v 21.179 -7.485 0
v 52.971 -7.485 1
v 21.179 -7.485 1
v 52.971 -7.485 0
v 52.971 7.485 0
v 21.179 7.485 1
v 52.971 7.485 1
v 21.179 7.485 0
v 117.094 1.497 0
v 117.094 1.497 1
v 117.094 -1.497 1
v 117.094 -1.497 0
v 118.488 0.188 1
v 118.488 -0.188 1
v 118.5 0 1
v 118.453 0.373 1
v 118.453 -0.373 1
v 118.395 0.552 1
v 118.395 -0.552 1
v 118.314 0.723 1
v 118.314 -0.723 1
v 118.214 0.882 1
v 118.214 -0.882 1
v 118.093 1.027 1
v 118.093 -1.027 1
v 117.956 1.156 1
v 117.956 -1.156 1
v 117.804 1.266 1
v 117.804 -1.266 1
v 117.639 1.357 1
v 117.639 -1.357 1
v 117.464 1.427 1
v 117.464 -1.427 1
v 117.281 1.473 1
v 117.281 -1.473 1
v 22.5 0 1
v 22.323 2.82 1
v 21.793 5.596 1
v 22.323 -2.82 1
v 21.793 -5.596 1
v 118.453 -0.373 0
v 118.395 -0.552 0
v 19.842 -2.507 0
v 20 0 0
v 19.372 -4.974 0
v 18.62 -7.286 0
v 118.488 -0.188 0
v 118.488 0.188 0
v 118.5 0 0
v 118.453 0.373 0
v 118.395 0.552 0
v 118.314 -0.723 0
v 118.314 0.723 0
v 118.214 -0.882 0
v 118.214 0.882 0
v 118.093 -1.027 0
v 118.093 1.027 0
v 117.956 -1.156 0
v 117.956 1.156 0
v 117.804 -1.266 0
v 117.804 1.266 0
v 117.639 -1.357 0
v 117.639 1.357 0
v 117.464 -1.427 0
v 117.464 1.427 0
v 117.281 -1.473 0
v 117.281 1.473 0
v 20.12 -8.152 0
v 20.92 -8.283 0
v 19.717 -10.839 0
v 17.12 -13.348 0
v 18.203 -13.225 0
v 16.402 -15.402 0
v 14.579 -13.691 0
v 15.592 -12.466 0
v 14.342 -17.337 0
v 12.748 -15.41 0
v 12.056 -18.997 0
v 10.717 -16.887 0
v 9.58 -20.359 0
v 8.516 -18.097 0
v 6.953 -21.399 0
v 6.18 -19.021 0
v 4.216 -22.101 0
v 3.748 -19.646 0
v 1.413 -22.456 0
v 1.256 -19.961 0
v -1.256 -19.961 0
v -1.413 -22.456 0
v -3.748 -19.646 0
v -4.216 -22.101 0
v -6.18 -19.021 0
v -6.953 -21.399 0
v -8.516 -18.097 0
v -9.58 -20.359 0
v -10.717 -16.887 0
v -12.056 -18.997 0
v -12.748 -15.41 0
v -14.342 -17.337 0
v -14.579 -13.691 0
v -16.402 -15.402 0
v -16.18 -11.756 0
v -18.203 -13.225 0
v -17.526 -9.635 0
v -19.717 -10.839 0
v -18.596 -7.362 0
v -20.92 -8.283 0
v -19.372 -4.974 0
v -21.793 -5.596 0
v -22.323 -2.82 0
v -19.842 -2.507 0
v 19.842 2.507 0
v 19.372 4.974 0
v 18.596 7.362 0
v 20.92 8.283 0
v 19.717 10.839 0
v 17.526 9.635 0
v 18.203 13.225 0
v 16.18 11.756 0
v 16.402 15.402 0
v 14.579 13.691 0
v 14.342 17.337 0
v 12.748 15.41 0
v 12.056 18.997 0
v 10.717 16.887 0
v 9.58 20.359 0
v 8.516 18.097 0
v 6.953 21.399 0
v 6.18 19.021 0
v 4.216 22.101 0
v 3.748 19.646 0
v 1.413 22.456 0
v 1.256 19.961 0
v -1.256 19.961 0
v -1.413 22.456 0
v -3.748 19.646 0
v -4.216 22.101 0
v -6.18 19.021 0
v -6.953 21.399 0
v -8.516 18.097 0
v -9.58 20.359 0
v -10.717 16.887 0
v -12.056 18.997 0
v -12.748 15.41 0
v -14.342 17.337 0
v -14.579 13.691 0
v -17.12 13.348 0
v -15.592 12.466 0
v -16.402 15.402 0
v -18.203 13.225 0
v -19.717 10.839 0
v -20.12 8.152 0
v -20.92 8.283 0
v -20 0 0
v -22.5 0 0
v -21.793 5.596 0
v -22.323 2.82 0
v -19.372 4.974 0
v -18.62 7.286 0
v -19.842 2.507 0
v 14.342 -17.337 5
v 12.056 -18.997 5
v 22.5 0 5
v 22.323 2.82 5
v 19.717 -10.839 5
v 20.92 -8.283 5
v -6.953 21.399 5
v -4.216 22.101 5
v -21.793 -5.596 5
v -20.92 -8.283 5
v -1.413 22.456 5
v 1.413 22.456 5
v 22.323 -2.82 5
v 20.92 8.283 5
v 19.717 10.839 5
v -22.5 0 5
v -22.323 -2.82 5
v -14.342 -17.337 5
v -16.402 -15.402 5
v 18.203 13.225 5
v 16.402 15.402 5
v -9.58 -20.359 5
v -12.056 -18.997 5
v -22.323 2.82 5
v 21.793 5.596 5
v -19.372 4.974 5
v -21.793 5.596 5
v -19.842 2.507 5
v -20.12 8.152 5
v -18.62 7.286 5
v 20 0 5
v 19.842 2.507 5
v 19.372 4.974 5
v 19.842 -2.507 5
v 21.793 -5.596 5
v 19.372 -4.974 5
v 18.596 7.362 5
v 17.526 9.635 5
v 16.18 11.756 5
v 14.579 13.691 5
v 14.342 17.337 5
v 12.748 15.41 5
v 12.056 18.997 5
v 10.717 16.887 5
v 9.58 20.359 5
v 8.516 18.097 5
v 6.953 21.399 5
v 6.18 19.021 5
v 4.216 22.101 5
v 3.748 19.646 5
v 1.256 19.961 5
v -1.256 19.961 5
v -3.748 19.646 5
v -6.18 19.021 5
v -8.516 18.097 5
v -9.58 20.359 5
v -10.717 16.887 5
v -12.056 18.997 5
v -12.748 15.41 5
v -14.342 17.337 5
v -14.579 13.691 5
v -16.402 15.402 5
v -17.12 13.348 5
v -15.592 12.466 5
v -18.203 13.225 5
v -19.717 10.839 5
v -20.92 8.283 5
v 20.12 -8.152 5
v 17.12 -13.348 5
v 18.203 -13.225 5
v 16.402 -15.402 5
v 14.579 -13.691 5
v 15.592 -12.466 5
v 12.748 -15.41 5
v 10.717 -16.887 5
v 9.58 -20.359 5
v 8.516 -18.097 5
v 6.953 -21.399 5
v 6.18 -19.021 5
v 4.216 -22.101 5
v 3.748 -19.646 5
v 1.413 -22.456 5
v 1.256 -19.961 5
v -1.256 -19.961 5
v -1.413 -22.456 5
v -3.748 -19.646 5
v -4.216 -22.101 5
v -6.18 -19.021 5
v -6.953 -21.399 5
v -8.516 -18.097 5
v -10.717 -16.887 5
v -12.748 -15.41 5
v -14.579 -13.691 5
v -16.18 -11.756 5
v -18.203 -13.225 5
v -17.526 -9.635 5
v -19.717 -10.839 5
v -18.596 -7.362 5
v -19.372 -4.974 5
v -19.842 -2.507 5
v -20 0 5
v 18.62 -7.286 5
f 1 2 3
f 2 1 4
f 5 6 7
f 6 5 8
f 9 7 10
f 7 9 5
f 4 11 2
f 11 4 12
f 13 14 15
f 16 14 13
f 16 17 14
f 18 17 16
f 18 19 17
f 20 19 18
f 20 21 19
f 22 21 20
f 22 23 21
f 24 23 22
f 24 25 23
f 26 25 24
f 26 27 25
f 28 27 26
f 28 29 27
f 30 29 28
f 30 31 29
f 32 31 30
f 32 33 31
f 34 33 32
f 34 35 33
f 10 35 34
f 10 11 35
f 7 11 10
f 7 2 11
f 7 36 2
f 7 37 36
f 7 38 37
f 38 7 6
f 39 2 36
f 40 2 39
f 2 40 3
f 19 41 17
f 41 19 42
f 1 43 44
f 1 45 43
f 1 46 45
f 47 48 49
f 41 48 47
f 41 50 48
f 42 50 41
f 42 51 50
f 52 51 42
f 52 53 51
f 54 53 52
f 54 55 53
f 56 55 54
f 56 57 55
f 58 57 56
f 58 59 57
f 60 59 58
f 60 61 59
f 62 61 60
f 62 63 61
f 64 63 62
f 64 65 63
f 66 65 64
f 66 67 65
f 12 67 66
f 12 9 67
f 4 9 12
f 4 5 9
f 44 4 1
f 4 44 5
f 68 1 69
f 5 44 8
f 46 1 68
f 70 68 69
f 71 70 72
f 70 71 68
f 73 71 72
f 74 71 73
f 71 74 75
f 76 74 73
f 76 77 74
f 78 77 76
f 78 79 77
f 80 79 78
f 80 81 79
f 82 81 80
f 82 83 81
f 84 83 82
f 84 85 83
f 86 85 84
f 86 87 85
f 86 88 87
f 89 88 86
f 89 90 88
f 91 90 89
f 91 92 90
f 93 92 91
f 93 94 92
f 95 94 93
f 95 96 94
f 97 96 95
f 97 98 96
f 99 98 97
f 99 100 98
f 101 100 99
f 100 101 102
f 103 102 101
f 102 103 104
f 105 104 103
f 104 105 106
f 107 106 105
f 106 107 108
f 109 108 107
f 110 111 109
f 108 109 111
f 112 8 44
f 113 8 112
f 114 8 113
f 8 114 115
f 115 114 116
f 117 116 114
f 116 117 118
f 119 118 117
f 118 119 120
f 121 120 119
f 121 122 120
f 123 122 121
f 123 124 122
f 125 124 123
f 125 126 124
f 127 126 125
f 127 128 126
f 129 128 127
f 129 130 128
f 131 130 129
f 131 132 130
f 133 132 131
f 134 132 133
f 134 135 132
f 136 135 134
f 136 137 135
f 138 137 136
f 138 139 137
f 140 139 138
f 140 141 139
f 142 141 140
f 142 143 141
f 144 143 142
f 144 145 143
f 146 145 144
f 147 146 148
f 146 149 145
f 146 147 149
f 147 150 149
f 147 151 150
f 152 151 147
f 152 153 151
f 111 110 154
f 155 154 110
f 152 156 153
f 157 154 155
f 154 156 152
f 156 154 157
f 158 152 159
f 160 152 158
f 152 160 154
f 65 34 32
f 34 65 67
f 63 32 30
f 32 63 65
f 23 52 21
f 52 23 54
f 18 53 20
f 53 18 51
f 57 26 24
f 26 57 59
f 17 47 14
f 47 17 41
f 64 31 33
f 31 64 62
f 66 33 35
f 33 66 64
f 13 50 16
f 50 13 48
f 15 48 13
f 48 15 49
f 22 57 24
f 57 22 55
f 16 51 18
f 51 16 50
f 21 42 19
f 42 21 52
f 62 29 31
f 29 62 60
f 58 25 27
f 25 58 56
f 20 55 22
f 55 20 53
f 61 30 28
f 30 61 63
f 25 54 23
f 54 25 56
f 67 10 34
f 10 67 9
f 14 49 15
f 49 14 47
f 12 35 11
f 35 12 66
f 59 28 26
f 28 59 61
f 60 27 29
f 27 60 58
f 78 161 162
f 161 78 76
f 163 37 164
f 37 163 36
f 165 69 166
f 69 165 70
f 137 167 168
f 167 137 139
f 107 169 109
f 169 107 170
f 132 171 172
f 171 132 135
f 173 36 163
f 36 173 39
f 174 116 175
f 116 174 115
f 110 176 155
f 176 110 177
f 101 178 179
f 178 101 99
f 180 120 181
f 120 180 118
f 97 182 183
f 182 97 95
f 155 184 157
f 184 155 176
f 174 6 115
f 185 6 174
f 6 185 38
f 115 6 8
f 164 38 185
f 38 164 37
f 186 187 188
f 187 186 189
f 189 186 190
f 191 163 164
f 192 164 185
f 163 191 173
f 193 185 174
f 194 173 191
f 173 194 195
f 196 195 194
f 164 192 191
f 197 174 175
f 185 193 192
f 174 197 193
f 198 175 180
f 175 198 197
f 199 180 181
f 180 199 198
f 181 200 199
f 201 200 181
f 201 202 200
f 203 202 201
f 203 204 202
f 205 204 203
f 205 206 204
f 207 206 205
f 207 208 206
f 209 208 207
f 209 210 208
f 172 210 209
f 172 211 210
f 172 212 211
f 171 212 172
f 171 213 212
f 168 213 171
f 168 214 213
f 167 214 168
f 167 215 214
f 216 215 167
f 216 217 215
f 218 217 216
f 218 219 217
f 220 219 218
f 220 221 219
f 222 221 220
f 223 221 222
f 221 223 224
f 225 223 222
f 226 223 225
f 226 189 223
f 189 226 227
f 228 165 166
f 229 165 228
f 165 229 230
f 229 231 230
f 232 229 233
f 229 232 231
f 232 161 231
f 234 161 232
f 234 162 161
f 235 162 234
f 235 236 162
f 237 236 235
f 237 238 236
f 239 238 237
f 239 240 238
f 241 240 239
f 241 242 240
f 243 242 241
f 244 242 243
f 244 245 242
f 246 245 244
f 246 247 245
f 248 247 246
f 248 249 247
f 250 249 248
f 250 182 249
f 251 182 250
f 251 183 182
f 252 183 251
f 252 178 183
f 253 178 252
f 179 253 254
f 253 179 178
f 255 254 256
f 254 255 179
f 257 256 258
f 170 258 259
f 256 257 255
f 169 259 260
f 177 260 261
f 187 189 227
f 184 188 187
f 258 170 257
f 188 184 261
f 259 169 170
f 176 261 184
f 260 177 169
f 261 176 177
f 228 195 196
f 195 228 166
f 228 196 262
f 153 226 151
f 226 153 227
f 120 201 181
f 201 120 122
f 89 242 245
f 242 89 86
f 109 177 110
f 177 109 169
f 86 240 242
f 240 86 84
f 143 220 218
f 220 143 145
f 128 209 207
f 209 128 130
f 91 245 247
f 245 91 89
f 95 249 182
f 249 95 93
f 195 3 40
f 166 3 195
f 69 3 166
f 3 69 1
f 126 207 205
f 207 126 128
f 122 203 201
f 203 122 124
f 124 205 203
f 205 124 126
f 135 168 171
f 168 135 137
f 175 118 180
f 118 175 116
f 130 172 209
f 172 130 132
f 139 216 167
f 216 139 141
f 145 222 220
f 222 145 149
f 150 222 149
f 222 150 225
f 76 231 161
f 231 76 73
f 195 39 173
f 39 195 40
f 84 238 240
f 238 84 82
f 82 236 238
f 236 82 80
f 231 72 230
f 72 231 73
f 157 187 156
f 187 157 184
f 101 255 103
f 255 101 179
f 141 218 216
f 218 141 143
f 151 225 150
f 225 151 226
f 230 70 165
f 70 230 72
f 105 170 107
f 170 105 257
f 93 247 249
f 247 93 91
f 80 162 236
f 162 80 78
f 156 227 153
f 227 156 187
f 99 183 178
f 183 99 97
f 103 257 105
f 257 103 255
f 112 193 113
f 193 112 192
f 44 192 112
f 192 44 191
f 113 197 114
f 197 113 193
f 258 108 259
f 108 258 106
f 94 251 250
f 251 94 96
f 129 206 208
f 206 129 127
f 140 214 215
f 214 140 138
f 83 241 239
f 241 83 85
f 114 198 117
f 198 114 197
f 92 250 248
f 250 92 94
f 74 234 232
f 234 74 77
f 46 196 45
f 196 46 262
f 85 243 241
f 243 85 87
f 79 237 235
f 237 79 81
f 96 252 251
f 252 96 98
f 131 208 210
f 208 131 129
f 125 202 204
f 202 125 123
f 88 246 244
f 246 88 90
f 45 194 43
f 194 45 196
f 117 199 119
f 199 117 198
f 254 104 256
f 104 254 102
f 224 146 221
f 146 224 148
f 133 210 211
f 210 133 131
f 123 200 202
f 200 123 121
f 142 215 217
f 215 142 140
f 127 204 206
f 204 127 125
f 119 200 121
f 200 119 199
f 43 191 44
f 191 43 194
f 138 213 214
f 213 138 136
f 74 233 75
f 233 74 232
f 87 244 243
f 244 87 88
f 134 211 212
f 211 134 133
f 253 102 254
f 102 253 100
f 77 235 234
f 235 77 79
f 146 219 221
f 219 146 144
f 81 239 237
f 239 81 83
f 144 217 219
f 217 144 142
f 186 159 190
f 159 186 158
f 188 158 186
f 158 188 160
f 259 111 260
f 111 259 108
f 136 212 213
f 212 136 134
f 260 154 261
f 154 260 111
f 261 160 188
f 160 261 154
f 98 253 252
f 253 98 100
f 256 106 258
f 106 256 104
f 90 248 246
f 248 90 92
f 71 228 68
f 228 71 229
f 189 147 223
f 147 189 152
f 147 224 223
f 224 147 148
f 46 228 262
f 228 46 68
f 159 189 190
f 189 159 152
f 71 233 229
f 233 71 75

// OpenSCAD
METER_DIA = 40;
METER_SLOT_WIDTH = 6;
METER_SLOT_DEPTH = 1.5;
METER_SLOT_ANGLE = -30;
METER_THICKNESS = 5;

WIDTH = 15;
LENGTH = 120;
THICKNESS = 1;
POINT = 3;

$fn = 50;

module support() {
    hull() {
        translate([(LENGTH-WIDTH)/2, 0, 0])
        cylinder(d = WIDTH, h = THICKNESS);

        cylinder(d = WIDTH, h = THICKNESS);

        translate([(LENGTH-POINT), 0, 0])
        cylinder(d = POINT, h = THICKNESS);
    }
}

module holder() {
    cylinder(d = METER_DIA + 2 * METER_SLOT_DEPTH + 2 * THICKNESS, h = METER_THICKNESS);
}

module meter() {
    cylinder(d = METER_DIA, h = METER_THICKNESS);
    rotate([0, 0, METER_SLOT_ANGLE])
    translate([-METER_DIA/2 - METER_SLOT_DEPTH, -METER_SLOT_WIDTH/2, 0])
    cube(size = [METER_SLOT_DEPTH * 2 + METER_DIA, METER_SLOT_WIDTH, METER_THICKNESS]);
}

difference() {
    union() {
        support();
        holder();
    }
    #meter();
}
